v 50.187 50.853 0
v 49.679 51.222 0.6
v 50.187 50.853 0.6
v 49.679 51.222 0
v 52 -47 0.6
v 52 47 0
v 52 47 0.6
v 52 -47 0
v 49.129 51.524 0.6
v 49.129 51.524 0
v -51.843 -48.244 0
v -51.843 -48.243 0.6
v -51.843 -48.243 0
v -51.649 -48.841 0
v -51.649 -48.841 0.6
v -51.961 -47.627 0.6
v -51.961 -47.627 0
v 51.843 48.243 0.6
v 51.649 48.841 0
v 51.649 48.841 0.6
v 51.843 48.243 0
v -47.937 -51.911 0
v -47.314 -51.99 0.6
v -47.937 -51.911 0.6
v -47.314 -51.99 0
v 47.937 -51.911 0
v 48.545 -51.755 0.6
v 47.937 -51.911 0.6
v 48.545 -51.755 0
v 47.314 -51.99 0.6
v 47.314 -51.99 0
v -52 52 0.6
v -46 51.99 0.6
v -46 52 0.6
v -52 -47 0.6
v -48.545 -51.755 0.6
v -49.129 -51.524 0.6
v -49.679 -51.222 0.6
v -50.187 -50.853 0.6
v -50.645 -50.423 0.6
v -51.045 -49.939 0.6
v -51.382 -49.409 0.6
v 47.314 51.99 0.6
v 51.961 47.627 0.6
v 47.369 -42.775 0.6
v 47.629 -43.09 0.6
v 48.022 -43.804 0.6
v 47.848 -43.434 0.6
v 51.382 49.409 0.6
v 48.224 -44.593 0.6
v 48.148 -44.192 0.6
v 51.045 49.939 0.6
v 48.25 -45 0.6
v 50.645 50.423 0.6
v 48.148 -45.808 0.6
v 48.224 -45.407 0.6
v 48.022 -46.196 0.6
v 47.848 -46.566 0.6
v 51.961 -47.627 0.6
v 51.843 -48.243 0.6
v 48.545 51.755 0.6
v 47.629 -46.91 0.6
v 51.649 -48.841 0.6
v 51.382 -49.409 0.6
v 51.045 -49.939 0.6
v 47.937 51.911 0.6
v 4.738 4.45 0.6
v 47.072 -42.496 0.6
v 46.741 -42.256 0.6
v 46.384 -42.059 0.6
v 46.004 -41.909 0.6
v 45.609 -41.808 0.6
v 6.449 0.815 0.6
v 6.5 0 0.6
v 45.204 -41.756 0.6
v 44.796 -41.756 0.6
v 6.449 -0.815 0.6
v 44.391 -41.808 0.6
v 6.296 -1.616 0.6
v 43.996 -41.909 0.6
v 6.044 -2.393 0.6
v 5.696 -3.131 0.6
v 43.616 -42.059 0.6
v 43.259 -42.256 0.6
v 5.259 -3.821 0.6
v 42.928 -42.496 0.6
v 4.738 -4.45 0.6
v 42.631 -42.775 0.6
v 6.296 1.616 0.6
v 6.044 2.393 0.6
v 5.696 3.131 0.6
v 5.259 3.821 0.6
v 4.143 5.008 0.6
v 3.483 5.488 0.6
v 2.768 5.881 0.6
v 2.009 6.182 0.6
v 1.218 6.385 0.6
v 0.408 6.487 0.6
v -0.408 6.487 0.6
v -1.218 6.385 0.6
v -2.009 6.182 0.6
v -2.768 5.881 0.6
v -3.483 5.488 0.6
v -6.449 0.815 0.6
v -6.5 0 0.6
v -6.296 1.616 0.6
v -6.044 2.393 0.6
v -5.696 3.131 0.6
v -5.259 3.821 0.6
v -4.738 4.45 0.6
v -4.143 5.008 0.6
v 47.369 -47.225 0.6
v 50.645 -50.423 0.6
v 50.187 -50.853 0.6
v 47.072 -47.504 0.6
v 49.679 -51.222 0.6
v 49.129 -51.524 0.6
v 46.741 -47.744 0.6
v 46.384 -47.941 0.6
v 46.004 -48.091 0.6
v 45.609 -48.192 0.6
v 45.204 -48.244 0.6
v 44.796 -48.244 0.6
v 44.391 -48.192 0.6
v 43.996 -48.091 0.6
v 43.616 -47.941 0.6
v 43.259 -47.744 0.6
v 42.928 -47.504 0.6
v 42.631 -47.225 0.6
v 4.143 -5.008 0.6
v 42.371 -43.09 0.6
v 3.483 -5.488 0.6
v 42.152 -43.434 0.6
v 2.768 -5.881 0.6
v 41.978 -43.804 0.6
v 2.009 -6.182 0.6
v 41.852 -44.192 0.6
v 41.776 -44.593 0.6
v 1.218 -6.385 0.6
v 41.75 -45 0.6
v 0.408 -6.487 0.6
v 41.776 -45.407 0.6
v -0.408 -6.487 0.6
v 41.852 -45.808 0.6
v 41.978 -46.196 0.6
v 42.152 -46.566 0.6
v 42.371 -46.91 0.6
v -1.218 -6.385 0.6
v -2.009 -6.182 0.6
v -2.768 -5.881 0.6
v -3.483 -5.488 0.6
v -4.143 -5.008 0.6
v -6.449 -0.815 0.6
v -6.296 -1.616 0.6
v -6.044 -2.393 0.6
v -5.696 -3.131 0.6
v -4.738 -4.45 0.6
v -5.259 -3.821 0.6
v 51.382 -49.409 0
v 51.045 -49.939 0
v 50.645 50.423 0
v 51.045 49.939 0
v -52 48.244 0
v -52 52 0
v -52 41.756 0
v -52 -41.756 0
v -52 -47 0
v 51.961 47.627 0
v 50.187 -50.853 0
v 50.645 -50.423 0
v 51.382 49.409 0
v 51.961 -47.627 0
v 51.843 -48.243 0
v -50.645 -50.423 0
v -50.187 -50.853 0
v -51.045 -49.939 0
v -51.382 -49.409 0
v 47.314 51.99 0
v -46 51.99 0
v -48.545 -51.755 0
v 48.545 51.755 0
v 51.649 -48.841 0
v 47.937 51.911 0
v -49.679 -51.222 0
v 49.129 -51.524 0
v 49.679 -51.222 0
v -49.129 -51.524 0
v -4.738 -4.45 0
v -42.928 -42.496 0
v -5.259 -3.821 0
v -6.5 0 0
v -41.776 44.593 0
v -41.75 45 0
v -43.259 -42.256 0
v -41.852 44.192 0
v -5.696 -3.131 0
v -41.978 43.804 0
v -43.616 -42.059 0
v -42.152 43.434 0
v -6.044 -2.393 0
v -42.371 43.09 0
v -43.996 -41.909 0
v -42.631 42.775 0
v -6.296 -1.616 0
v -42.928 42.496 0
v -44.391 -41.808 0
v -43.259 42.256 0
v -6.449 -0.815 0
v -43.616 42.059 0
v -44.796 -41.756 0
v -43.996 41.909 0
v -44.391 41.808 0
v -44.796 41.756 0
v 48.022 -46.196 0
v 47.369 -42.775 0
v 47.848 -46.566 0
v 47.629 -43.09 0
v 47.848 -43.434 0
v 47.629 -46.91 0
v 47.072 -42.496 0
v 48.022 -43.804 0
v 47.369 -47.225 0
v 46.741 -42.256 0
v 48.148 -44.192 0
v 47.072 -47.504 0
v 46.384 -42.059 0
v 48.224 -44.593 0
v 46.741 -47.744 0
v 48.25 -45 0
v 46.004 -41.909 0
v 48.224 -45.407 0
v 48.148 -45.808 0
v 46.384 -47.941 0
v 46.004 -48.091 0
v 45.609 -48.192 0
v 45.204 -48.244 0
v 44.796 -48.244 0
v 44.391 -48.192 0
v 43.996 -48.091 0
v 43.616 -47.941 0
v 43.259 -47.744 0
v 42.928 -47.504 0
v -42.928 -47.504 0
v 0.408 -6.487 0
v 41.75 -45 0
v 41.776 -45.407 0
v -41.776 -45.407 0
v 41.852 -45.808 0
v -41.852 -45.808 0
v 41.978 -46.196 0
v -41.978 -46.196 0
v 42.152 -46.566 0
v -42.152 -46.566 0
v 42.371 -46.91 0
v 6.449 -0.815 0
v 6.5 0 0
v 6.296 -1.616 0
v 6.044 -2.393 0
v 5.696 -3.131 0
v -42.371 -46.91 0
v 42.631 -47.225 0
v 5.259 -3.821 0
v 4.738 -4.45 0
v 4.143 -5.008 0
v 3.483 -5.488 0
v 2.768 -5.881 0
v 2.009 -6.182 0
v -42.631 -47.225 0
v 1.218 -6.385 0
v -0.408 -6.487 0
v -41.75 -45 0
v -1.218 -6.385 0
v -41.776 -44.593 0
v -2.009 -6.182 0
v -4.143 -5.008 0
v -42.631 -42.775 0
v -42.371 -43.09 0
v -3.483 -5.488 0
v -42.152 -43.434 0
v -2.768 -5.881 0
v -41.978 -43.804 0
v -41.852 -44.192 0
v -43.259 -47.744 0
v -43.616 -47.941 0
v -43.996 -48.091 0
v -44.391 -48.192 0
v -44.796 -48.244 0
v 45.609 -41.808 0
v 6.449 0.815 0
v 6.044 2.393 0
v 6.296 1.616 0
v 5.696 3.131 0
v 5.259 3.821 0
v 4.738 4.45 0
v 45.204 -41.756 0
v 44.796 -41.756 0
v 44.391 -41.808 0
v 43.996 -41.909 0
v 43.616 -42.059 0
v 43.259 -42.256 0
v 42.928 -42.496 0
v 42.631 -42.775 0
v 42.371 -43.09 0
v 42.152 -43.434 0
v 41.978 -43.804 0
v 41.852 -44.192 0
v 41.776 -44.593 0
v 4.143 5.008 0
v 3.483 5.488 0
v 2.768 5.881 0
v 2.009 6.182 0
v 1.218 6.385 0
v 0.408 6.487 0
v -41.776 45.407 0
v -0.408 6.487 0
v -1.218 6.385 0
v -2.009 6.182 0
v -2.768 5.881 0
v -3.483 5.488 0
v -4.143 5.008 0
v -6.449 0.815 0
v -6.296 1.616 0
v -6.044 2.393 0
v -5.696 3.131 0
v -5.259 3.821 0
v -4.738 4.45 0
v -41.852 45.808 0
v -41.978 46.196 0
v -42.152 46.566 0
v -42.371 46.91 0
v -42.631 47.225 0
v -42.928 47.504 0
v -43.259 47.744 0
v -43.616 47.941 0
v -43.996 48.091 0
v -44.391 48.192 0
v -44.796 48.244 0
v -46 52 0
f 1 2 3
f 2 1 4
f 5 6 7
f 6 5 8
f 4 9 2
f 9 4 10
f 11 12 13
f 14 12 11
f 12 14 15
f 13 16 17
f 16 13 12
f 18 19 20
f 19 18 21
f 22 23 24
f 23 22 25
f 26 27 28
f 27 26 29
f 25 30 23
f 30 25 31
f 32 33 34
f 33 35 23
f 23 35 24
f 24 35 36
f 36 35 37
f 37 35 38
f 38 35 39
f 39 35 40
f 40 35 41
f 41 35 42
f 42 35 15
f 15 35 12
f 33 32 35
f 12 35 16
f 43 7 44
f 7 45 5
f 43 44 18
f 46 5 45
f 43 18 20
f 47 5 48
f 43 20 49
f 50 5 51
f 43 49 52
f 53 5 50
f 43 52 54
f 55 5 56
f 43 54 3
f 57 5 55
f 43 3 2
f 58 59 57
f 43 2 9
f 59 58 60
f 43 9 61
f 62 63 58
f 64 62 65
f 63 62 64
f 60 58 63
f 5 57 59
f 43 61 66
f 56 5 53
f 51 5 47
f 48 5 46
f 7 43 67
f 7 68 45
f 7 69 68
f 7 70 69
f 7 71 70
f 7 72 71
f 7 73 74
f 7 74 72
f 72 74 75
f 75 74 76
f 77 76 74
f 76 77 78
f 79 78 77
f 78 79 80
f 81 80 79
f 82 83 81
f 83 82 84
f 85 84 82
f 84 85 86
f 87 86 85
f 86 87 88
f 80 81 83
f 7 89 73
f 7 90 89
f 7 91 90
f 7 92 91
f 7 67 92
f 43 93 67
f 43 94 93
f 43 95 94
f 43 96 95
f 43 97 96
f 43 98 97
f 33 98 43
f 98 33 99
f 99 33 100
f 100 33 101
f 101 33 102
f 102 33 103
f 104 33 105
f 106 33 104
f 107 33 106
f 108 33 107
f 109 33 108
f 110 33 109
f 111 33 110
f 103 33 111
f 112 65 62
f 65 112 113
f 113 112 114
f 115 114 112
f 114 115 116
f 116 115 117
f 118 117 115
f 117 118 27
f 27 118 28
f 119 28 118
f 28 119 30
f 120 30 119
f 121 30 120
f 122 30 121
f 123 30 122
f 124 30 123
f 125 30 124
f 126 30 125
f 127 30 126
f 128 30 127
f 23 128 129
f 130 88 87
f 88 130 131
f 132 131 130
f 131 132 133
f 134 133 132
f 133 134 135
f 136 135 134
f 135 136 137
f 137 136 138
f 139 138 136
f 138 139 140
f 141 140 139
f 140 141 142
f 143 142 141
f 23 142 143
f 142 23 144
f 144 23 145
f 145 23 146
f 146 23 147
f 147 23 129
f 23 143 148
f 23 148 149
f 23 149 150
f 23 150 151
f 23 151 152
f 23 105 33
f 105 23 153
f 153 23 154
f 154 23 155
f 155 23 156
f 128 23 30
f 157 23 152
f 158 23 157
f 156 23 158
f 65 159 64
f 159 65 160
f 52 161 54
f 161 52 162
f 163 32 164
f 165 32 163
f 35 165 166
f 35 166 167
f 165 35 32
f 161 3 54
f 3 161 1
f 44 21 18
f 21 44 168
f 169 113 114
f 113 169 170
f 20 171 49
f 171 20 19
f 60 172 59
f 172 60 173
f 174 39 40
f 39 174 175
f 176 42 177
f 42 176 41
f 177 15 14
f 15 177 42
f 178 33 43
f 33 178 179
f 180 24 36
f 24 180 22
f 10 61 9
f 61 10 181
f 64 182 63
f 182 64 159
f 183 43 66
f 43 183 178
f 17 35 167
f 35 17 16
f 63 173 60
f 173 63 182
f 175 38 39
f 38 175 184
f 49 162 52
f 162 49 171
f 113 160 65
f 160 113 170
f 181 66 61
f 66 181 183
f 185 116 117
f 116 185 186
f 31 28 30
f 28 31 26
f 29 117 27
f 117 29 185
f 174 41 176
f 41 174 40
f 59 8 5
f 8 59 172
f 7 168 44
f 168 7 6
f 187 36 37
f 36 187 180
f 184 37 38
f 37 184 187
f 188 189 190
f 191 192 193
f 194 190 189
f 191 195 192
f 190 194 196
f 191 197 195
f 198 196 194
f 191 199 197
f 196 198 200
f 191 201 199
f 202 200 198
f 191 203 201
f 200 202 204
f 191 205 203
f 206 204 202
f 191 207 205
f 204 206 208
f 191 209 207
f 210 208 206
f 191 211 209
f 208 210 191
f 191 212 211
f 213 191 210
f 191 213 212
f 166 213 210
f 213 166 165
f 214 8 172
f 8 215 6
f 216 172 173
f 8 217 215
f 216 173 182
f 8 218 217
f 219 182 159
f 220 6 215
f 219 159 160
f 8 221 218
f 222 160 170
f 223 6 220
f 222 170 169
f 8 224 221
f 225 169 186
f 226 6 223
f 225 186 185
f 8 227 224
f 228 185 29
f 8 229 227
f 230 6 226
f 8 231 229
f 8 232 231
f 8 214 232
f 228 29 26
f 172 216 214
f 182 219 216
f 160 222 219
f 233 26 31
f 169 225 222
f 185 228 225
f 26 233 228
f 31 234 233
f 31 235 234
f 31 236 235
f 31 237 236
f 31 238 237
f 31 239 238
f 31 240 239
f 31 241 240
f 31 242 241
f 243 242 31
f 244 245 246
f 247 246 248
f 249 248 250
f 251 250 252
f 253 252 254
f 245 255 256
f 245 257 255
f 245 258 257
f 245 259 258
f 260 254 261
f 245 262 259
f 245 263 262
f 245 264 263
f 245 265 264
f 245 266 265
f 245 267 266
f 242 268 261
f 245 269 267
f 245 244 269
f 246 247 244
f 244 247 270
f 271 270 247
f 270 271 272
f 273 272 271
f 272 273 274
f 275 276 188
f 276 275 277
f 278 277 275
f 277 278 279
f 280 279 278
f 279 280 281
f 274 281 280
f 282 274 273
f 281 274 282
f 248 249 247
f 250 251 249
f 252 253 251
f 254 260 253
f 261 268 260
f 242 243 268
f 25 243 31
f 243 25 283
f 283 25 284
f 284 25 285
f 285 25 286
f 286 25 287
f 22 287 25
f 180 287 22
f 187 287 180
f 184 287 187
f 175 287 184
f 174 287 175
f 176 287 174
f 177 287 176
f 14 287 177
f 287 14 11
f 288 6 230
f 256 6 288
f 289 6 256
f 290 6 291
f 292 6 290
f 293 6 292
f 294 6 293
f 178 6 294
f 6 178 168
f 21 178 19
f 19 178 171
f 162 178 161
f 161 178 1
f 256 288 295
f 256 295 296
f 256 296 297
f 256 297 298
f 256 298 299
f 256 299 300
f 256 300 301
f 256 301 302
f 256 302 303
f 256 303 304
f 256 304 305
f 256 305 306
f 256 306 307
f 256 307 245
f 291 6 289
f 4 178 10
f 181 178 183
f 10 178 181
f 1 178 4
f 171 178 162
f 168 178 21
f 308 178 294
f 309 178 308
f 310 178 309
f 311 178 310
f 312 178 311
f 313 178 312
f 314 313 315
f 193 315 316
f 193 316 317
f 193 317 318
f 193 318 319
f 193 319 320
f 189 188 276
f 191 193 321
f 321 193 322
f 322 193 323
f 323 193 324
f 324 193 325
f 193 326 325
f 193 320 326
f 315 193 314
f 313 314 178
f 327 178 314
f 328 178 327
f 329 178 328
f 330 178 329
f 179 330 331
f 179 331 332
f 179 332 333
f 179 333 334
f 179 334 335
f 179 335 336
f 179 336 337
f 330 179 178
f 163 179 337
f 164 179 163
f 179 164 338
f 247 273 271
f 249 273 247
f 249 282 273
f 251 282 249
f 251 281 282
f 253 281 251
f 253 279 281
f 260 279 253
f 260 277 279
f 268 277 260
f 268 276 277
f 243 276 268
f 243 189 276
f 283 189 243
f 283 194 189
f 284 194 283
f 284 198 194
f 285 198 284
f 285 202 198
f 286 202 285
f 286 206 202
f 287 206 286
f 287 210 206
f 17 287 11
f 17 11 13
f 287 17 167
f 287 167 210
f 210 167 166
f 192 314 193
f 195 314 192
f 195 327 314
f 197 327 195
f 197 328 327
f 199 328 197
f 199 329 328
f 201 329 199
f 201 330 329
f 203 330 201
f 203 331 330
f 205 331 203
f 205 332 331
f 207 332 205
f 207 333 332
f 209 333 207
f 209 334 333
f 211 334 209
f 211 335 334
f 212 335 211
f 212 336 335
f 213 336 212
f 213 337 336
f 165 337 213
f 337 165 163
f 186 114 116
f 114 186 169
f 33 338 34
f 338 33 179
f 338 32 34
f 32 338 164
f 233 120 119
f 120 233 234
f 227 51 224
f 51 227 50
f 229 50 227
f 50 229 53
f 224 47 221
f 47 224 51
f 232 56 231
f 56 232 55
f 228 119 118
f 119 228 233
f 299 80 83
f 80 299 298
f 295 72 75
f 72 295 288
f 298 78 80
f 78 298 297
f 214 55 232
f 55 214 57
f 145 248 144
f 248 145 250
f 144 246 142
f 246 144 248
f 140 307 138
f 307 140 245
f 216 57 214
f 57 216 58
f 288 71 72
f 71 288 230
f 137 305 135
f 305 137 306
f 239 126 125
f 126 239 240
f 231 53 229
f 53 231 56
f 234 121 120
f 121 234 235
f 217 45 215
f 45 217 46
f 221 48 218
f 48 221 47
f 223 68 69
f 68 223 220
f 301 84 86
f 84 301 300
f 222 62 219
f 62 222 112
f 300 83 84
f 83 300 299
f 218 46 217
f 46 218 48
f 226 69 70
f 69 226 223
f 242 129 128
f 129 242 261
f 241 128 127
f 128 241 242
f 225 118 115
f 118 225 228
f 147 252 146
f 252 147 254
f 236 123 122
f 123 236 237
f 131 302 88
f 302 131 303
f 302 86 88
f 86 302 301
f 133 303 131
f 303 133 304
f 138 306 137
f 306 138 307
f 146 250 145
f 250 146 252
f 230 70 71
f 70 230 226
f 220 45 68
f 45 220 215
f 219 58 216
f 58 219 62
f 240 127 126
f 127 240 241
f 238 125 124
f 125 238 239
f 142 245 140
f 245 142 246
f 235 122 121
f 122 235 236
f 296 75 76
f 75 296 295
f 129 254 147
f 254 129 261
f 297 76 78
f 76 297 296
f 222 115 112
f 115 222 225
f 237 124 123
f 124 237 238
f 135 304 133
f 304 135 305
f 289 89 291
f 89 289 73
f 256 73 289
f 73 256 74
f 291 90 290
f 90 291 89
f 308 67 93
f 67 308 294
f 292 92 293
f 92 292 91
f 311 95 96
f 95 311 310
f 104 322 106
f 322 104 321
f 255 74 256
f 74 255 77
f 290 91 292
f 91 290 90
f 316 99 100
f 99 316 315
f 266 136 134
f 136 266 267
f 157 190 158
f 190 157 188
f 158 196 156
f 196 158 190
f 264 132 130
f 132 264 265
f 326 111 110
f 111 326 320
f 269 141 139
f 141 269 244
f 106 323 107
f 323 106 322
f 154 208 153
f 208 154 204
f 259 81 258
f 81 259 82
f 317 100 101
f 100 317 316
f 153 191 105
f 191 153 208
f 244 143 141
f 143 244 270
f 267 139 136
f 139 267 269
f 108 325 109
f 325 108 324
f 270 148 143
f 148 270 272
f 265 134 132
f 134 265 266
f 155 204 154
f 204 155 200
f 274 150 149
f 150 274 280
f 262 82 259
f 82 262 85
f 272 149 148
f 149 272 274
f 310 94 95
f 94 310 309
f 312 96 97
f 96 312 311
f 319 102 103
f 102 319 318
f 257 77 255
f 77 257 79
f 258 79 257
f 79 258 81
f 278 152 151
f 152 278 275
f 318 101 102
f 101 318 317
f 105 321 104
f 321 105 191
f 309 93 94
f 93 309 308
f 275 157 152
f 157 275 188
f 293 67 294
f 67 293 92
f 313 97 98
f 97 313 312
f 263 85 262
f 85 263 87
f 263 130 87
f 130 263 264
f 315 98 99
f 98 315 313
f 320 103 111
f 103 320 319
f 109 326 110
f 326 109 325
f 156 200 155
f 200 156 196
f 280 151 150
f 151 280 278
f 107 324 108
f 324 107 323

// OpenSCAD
$fn = 50;


difference() {
	union() {
		hull() {
			translate(v = [-47.0000000000, 47.0000000000, 0]) {
				cylinder(h = 0.6000000000, r = 5);
			}
			translate(v = [47.0000000000, 47.0000000000, 0]) {
				cylinder(h = 0.6000000000, r = 5);
			}
			translate(v = [-47.0000000000, -47.0000000000, 0]) {
				cylinder(h = 0.6000000000, r = 5);
			}
			translate(v = [47.0000000000, -47.0000000000, 0]) {
				cylinder(h = 0.6000000000, r = 5);
			}
		}
		translate(v = [-52.0000000000, 46.0000000000, 0]) {
			cube(size = [6, 6, 0.6000000000]);
		}
	}
	union() {
		translate(v = [-52.5000000000, -45.0000000000, -250.0000000000]) {
			rotate(a = [0, 0, 0]) {
				difference() {
					union() {
						hull() {
							translate(v = [7.5000000000, 0, 0]) {
								cylinder(h = 250, r = 3.2500000000, r1 = 3.2500000000, r2 = 3.2500000000);
							}
							translate(v = [-7.5000000000, 0, 0]) {
								cylinder(h = 250, r = 3.2500000000, r1 = 3.2500000000, r2 = 3.2500000000);
							}
						}
					}
					union();
				}
			}
		}
		translate(v = [-52.5000000000, 45.0000000000, -250.0000000000]) {
			rotate(a = [0, 0, 0]) {
				difference() {
					union() {
						hull() {
							translate(v = [7.5000000000, 0, 0]) {
								cylinder(h = 250, r = 3.2500000000, r1 = 3.2500000000, r2 = 3.2500000000);
							}
							translate(v = [-7.5000000000, 0, 0]) {
								cylinder(h = 250, r = 3.2500000000, r1 = 3.2500000000, r2 = 3.2500000000);
							}
						}
					}
					union();
				}
			}
		}
		translate(v = [45.0000000000, -45.0000000000, -50.0000000000]) {
			cylinder(h = 100, r = 3.2500000000);
		}
		cylinder(h = 0.6000000000, r = 6.5000000000);
	}
}
